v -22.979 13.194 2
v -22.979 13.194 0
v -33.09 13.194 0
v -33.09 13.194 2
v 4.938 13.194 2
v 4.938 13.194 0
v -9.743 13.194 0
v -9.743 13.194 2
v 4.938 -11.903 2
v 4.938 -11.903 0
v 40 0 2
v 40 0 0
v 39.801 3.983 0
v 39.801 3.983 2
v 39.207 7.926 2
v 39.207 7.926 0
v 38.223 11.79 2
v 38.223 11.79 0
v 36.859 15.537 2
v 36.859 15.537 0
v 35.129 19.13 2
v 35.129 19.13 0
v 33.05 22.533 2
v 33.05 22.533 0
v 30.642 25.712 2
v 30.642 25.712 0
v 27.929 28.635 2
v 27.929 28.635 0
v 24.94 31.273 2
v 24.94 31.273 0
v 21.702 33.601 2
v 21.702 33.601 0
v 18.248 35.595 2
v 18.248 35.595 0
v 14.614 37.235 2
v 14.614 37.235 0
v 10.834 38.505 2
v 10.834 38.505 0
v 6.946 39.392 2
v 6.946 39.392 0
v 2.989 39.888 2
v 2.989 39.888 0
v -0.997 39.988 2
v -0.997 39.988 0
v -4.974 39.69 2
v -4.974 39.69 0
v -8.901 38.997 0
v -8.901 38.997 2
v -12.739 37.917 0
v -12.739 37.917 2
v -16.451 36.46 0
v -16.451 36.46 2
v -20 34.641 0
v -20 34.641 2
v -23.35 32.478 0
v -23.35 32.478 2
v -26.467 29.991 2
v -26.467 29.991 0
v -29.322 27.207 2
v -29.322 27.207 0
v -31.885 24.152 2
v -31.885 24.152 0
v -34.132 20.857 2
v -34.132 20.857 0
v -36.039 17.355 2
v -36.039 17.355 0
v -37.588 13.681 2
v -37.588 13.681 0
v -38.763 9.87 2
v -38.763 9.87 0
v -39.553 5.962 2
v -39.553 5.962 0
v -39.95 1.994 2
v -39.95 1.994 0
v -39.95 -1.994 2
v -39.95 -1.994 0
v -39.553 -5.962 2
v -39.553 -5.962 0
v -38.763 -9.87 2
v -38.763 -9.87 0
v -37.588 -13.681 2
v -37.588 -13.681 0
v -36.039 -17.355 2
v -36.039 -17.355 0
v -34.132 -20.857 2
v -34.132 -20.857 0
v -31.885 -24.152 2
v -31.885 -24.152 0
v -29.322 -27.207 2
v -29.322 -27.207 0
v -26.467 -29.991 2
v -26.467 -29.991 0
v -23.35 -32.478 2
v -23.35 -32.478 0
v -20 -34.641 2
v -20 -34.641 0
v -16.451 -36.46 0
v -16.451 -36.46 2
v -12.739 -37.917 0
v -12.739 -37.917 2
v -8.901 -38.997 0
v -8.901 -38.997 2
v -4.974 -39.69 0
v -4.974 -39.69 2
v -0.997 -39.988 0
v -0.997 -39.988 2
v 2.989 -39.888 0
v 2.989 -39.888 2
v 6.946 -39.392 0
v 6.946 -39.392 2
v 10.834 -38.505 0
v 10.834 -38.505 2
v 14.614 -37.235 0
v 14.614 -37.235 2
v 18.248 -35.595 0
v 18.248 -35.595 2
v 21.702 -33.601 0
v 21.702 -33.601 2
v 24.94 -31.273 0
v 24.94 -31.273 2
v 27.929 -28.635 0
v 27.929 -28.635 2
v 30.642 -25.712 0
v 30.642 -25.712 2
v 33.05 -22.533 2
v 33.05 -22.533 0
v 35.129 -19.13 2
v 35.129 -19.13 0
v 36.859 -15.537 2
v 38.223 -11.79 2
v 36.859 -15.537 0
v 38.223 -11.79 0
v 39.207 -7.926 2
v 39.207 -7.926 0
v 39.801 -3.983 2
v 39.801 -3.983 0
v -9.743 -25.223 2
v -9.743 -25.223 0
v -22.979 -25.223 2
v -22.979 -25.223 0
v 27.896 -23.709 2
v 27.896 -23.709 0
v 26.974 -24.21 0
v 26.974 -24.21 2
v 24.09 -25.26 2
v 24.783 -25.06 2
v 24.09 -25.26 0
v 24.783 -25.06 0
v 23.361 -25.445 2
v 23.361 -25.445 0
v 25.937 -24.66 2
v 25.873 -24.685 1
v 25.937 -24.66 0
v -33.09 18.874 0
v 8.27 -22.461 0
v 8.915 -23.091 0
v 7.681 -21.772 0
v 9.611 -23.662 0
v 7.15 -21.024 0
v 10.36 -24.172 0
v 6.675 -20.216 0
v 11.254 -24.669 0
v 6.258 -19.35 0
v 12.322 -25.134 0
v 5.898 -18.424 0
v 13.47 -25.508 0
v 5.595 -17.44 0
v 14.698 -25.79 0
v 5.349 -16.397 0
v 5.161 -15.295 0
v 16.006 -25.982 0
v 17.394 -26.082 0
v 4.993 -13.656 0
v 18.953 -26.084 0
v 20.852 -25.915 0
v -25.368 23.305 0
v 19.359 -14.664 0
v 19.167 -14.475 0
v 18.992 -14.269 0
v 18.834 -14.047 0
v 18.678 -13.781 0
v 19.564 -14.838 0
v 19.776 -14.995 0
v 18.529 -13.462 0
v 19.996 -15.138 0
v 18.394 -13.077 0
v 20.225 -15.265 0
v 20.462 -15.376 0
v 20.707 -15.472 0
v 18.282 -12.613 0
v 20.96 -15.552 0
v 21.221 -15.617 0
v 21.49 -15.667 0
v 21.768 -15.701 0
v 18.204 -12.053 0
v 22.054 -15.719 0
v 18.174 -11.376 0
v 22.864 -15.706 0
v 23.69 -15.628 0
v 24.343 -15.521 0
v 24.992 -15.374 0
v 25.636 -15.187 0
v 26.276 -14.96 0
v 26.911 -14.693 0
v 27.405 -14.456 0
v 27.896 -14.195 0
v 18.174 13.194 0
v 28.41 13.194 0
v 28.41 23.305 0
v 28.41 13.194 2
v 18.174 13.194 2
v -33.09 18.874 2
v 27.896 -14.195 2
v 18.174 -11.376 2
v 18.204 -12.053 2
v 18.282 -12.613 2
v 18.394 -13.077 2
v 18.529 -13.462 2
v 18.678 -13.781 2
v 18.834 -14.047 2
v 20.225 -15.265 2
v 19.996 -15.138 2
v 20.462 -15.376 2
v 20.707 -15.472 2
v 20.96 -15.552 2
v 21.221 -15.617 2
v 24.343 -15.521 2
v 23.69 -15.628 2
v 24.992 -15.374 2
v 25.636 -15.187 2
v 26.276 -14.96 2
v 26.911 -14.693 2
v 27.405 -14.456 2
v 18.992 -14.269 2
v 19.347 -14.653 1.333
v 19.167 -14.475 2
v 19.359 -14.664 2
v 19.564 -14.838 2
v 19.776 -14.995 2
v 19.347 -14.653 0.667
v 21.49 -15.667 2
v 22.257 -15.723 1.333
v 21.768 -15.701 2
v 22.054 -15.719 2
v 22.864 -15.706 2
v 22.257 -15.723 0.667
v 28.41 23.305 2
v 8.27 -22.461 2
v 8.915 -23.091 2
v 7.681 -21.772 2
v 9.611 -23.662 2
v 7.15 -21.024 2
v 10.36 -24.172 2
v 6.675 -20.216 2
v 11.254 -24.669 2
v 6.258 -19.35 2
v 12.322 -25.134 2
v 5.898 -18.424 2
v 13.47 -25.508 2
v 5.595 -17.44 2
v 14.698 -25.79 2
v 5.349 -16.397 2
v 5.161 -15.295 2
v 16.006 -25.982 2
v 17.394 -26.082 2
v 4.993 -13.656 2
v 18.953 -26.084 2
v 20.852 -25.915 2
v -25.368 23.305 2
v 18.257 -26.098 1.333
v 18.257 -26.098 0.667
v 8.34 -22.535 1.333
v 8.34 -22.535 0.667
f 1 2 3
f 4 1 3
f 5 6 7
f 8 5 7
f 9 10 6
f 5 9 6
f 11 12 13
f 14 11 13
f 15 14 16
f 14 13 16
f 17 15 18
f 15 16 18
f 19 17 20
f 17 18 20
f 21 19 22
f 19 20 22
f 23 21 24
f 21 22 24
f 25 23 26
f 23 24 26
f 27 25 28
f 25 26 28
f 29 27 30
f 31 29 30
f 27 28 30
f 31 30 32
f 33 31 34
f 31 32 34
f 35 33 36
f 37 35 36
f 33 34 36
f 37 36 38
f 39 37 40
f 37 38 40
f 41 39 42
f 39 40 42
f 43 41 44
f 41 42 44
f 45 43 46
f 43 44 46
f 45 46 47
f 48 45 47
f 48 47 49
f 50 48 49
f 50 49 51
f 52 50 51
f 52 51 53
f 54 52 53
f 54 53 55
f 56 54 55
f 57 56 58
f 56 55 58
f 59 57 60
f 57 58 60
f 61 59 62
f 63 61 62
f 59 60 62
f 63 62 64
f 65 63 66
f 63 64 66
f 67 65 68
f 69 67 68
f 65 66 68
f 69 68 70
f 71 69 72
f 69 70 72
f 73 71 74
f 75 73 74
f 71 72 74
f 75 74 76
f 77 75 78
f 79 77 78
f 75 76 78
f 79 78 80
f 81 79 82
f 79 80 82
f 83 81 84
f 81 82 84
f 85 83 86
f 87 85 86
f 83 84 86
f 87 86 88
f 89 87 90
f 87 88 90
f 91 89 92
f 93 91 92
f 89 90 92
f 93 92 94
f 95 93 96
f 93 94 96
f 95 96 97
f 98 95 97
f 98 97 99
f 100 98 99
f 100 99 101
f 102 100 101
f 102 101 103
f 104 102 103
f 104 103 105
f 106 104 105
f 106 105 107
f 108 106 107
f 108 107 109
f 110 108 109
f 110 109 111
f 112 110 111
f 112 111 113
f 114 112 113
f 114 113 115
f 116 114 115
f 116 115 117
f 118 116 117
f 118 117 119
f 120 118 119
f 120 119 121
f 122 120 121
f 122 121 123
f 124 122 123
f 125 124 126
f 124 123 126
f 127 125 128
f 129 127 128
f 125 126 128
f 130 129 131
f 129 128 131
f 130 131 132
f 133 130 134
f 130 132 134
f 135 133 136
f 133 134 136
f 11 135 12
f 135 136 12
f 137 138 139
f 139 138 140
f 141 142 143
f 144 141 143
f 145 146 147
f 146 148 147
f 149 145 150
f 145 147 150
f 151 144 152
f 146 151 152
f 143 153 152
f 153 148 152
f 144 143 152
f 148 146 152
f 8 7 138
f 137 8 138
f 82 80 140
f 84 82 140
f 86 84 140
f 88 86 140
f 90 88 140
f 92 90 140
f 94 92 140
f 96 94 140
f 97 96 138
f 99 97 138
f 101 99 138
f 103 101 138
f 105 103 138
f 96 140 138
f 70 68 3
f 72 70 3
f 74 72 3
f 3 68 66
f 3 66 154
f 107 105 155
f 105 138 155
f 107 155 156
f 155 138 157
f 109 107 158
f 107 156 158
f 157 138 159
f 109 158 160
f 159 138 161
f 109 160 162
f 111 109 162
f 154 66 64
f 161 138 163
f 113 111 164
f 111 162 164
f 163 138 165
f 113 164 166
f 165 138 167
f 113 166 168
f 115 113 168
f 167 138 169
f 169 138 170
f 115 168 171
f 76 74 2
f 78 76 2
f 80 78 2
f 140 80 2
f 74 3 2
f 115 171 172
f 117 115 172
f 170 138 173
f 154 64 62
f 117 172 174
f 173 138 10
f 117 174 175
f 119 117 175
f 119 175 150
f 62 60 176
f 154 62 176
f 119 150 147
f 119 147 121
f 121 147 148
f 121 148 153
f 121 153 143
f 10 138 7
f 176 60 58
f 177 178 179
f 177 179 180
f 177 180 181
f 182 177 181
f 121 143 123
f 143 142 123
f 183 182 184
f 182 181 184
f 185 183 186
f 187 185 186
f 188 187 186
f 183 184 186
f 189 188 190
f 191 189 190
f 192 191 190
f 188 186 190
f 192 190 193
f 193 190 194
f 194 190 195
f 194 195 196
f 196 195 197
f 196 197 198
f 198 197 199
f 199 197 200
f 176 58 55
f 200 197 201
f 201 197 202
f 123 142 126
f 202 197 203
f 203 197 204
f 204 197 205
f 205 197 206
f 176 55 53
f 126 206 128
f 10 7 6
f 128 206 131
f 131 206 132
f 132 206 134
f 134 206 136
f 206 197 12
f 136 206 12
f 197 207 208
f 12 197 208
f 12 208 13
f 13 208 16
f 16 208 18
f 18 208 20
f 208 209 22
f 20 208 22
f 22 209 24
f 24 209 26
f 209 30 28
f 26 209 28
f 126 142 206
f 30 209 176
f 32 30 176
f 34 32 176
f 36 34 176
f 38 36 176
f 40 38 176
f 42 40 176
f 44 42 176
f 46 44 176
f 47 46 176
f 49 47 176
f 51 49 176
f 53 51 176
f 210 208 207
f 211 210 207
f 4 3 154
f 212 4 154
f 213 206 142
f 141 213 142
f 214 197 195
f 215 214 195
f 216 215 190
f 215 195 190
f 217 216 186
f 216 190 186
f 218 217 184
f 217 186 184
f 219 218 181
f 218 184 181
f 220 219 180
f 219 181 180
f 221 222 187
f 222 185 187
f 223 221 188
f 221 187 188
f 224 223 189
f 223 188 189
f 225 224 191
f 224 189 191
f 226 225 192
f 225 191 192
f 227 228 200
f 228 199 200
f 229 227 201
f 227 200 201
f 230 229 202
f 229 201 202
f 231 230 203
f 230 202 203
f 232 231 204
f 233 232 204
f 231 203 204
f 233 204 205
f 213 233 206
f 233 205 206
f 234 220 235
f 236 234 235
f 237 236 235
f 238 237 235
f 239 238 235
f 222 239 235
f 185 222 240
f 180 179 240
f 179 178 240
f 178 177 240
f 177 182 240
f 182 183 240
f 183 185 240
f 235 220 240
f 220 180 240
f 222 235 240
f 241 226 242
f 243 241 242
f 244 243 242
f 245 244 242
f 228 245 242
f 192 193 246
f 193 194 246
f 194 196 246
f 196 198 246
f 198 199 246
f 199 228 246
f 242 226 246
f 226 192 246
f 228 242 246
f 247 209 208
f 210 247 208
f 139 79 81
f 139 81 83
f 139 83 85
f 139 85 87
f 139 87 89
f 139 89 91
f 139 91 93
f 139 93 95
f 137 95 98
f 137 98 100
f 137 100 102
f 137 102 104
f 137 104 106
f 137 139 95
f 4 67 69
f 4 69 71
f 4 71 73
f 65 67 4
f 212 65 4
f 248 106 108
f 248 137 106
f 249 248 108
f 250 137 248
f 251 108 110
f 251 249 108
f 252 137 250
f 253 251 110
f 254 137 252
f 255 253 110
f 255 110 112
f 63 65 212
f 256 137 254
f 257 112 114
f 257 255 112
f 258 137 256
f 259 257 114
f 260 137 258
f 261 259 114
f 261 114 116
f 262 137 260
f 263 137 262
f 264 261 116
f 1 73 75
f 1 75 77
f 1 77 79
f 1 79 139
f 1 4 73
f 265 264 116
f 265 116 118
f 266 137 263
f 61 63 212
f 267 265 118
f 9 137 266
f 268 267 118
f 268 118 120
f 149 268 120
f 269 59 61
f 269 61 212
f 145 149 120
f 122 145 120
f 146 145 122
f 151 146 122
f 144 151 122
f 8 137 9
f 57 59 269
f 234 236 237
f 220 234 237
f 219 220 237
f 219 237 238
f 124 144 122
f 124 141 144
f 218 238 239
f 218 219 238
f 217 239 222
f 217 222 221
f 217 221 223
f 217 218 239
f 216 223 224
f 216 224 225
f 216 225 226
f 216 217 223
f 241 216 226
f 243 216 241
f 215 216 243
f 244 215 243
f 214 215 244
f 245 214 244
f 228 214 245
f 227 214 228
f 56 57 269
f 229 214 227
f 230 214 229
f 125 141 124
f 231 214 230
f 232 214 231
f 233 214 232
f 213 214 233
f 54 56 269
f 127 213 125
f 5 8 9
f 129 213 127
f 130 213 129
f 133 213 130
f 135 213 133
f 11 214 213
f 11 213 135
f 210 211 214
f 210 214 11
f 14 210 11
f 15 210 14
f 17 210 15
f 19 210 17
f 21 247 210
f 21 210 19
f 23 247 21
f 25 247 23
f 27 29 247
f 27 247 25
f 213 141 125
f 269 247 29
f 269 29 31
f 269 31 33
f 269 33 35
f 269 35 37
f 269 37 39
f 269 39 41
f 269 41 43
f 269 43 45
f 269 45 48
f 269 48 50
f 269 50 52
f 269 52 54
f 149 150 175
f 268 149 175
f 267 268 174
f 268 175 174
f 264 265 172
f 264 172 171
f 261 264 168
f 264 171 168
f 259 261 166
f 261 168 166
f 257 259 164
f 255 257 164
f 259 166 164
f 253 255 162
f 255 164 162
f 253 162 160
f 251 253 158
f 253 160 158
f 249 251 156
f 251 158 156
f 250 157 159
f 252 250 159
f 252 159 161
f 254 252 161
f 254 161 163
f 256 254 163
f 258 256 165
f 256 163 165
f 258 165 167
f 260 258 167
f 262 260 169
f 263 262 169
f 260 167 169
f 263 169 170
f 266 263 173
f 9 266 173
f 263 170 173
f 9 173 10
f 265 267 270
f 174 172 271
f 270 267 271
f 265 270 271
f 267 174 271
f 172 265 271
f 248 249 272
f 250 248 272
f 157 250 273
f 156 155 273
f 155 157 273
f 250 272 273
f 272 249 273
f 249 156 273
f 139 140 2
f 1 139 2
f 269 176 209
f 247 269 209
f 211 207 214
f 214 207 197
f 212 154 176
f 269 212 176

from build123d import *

# Parameters (mm, degrees)
F0_R     = 40
F1_DEPTH = 2


with BuildPart() as f1:
    # F0 (on Top) → F1 (new body)
    with BuildSketch(Plane.XY):
        Circle(F0_R)
        with BuildLine():
            add(Edge.make_bspline(
                [(19.3472222222, -14.6533066589), (20.5208333333, -15.7227511033), (22.2569444444, -15.7227511033)],
                knots=[0, 0, 0, 1, 1, 1], degree=2))
            add(Edge.make_bspline(
                [(22.2569444444, -15.7227511033), (25.1597222222, -15.7227511033), (27.8958333333, -14.1949733256)],
                knots=[0, 0, 0, 1, 1, 1], degree=2))
            Line((27.8958333333, -14.1949733256), (27.8958333333, -23.7088622145))
            add(Edge.make_bspline(
                [(27.8958333333, -23.7088622145), (26.1180555556, -24.7921955478), (23.3611111111, -25.4449733256)],
                knots=[0, 0, 0, 1, 1, 1], degree=2))
            add(Edge.make_bspline(
                [(23.3611111111, -25.4449733256), (20.6041666667, -26.0977511033), (18.2569444444, -26.0977511033)],
                knots=[0, 0, 0, 1, 1, 1], degree=2))
            add(Edge.make_bspline(
                [(18.2569444444, -26.0977511033), (11.7430555556, -26.0977511033), (8.3402777778, -22.5352511033)],
                knots=[0, 0, 0, 1, 1, 1], degree=2))
            add(Edge.make_bspline(
                [(8.3402777778, -22.5352511033), (4.9375, -18.9727511033), (4.9375, -11.9033066589)],
                knots=[0, 0, 0, 1, 1, 1], degree=2))
            Line((4.9375, -11.9033066589), (4.9375, 13.1939155633))
            Line((4.9375, 13.1939155633), (-9.7430555556, 13.1939155633))
            Line((-9.7430555556, 13.1939155633), (-9.7430555556, -25.2227511033))
            Line((-9.7430555556, -25.2227511033), (-22.9791666667, -25.2227511033))
            Line((-22.9791666667, -25.2227511033), (-22.9791666667, 13.1939155633))
            Line((-22.9791666667, 13.1939155633), (-33.0902777778, 13.1939155633))
            Line((-33.0902777778, 13.1939155633), (-33.0902777778, 18.8744711189))
            Line((-33.0902777778, 18.8744711189), (-25.3680555556, 23.3050266744))
            Line((-25.3680555556, 23.3050266744), (28.4097222222, 23.3050266744))
            Line((28.4097222222, 23.3050266744), (28.4097222222, 13.1939155633))
            Line((28.4097222222, 13.1939155633), (18.1736111111, 13.1939155633))
            Line((18.1736111111, 13.1939155633), (18.1736111111, -11.3755288811))
            add(Edge.make_bspline(
                [(18.1736111111, -11.3755288811), (18.1736111111, -13.5838622145), (19.3472222222, -14.6533066589)],
                knots=[0, 0, 0, 1, 1, 1], degree=2))
        make_face(mode=Mode.SUBTRACT)
    extrude(amount=F1_DEPTH)


solid = f1.part
